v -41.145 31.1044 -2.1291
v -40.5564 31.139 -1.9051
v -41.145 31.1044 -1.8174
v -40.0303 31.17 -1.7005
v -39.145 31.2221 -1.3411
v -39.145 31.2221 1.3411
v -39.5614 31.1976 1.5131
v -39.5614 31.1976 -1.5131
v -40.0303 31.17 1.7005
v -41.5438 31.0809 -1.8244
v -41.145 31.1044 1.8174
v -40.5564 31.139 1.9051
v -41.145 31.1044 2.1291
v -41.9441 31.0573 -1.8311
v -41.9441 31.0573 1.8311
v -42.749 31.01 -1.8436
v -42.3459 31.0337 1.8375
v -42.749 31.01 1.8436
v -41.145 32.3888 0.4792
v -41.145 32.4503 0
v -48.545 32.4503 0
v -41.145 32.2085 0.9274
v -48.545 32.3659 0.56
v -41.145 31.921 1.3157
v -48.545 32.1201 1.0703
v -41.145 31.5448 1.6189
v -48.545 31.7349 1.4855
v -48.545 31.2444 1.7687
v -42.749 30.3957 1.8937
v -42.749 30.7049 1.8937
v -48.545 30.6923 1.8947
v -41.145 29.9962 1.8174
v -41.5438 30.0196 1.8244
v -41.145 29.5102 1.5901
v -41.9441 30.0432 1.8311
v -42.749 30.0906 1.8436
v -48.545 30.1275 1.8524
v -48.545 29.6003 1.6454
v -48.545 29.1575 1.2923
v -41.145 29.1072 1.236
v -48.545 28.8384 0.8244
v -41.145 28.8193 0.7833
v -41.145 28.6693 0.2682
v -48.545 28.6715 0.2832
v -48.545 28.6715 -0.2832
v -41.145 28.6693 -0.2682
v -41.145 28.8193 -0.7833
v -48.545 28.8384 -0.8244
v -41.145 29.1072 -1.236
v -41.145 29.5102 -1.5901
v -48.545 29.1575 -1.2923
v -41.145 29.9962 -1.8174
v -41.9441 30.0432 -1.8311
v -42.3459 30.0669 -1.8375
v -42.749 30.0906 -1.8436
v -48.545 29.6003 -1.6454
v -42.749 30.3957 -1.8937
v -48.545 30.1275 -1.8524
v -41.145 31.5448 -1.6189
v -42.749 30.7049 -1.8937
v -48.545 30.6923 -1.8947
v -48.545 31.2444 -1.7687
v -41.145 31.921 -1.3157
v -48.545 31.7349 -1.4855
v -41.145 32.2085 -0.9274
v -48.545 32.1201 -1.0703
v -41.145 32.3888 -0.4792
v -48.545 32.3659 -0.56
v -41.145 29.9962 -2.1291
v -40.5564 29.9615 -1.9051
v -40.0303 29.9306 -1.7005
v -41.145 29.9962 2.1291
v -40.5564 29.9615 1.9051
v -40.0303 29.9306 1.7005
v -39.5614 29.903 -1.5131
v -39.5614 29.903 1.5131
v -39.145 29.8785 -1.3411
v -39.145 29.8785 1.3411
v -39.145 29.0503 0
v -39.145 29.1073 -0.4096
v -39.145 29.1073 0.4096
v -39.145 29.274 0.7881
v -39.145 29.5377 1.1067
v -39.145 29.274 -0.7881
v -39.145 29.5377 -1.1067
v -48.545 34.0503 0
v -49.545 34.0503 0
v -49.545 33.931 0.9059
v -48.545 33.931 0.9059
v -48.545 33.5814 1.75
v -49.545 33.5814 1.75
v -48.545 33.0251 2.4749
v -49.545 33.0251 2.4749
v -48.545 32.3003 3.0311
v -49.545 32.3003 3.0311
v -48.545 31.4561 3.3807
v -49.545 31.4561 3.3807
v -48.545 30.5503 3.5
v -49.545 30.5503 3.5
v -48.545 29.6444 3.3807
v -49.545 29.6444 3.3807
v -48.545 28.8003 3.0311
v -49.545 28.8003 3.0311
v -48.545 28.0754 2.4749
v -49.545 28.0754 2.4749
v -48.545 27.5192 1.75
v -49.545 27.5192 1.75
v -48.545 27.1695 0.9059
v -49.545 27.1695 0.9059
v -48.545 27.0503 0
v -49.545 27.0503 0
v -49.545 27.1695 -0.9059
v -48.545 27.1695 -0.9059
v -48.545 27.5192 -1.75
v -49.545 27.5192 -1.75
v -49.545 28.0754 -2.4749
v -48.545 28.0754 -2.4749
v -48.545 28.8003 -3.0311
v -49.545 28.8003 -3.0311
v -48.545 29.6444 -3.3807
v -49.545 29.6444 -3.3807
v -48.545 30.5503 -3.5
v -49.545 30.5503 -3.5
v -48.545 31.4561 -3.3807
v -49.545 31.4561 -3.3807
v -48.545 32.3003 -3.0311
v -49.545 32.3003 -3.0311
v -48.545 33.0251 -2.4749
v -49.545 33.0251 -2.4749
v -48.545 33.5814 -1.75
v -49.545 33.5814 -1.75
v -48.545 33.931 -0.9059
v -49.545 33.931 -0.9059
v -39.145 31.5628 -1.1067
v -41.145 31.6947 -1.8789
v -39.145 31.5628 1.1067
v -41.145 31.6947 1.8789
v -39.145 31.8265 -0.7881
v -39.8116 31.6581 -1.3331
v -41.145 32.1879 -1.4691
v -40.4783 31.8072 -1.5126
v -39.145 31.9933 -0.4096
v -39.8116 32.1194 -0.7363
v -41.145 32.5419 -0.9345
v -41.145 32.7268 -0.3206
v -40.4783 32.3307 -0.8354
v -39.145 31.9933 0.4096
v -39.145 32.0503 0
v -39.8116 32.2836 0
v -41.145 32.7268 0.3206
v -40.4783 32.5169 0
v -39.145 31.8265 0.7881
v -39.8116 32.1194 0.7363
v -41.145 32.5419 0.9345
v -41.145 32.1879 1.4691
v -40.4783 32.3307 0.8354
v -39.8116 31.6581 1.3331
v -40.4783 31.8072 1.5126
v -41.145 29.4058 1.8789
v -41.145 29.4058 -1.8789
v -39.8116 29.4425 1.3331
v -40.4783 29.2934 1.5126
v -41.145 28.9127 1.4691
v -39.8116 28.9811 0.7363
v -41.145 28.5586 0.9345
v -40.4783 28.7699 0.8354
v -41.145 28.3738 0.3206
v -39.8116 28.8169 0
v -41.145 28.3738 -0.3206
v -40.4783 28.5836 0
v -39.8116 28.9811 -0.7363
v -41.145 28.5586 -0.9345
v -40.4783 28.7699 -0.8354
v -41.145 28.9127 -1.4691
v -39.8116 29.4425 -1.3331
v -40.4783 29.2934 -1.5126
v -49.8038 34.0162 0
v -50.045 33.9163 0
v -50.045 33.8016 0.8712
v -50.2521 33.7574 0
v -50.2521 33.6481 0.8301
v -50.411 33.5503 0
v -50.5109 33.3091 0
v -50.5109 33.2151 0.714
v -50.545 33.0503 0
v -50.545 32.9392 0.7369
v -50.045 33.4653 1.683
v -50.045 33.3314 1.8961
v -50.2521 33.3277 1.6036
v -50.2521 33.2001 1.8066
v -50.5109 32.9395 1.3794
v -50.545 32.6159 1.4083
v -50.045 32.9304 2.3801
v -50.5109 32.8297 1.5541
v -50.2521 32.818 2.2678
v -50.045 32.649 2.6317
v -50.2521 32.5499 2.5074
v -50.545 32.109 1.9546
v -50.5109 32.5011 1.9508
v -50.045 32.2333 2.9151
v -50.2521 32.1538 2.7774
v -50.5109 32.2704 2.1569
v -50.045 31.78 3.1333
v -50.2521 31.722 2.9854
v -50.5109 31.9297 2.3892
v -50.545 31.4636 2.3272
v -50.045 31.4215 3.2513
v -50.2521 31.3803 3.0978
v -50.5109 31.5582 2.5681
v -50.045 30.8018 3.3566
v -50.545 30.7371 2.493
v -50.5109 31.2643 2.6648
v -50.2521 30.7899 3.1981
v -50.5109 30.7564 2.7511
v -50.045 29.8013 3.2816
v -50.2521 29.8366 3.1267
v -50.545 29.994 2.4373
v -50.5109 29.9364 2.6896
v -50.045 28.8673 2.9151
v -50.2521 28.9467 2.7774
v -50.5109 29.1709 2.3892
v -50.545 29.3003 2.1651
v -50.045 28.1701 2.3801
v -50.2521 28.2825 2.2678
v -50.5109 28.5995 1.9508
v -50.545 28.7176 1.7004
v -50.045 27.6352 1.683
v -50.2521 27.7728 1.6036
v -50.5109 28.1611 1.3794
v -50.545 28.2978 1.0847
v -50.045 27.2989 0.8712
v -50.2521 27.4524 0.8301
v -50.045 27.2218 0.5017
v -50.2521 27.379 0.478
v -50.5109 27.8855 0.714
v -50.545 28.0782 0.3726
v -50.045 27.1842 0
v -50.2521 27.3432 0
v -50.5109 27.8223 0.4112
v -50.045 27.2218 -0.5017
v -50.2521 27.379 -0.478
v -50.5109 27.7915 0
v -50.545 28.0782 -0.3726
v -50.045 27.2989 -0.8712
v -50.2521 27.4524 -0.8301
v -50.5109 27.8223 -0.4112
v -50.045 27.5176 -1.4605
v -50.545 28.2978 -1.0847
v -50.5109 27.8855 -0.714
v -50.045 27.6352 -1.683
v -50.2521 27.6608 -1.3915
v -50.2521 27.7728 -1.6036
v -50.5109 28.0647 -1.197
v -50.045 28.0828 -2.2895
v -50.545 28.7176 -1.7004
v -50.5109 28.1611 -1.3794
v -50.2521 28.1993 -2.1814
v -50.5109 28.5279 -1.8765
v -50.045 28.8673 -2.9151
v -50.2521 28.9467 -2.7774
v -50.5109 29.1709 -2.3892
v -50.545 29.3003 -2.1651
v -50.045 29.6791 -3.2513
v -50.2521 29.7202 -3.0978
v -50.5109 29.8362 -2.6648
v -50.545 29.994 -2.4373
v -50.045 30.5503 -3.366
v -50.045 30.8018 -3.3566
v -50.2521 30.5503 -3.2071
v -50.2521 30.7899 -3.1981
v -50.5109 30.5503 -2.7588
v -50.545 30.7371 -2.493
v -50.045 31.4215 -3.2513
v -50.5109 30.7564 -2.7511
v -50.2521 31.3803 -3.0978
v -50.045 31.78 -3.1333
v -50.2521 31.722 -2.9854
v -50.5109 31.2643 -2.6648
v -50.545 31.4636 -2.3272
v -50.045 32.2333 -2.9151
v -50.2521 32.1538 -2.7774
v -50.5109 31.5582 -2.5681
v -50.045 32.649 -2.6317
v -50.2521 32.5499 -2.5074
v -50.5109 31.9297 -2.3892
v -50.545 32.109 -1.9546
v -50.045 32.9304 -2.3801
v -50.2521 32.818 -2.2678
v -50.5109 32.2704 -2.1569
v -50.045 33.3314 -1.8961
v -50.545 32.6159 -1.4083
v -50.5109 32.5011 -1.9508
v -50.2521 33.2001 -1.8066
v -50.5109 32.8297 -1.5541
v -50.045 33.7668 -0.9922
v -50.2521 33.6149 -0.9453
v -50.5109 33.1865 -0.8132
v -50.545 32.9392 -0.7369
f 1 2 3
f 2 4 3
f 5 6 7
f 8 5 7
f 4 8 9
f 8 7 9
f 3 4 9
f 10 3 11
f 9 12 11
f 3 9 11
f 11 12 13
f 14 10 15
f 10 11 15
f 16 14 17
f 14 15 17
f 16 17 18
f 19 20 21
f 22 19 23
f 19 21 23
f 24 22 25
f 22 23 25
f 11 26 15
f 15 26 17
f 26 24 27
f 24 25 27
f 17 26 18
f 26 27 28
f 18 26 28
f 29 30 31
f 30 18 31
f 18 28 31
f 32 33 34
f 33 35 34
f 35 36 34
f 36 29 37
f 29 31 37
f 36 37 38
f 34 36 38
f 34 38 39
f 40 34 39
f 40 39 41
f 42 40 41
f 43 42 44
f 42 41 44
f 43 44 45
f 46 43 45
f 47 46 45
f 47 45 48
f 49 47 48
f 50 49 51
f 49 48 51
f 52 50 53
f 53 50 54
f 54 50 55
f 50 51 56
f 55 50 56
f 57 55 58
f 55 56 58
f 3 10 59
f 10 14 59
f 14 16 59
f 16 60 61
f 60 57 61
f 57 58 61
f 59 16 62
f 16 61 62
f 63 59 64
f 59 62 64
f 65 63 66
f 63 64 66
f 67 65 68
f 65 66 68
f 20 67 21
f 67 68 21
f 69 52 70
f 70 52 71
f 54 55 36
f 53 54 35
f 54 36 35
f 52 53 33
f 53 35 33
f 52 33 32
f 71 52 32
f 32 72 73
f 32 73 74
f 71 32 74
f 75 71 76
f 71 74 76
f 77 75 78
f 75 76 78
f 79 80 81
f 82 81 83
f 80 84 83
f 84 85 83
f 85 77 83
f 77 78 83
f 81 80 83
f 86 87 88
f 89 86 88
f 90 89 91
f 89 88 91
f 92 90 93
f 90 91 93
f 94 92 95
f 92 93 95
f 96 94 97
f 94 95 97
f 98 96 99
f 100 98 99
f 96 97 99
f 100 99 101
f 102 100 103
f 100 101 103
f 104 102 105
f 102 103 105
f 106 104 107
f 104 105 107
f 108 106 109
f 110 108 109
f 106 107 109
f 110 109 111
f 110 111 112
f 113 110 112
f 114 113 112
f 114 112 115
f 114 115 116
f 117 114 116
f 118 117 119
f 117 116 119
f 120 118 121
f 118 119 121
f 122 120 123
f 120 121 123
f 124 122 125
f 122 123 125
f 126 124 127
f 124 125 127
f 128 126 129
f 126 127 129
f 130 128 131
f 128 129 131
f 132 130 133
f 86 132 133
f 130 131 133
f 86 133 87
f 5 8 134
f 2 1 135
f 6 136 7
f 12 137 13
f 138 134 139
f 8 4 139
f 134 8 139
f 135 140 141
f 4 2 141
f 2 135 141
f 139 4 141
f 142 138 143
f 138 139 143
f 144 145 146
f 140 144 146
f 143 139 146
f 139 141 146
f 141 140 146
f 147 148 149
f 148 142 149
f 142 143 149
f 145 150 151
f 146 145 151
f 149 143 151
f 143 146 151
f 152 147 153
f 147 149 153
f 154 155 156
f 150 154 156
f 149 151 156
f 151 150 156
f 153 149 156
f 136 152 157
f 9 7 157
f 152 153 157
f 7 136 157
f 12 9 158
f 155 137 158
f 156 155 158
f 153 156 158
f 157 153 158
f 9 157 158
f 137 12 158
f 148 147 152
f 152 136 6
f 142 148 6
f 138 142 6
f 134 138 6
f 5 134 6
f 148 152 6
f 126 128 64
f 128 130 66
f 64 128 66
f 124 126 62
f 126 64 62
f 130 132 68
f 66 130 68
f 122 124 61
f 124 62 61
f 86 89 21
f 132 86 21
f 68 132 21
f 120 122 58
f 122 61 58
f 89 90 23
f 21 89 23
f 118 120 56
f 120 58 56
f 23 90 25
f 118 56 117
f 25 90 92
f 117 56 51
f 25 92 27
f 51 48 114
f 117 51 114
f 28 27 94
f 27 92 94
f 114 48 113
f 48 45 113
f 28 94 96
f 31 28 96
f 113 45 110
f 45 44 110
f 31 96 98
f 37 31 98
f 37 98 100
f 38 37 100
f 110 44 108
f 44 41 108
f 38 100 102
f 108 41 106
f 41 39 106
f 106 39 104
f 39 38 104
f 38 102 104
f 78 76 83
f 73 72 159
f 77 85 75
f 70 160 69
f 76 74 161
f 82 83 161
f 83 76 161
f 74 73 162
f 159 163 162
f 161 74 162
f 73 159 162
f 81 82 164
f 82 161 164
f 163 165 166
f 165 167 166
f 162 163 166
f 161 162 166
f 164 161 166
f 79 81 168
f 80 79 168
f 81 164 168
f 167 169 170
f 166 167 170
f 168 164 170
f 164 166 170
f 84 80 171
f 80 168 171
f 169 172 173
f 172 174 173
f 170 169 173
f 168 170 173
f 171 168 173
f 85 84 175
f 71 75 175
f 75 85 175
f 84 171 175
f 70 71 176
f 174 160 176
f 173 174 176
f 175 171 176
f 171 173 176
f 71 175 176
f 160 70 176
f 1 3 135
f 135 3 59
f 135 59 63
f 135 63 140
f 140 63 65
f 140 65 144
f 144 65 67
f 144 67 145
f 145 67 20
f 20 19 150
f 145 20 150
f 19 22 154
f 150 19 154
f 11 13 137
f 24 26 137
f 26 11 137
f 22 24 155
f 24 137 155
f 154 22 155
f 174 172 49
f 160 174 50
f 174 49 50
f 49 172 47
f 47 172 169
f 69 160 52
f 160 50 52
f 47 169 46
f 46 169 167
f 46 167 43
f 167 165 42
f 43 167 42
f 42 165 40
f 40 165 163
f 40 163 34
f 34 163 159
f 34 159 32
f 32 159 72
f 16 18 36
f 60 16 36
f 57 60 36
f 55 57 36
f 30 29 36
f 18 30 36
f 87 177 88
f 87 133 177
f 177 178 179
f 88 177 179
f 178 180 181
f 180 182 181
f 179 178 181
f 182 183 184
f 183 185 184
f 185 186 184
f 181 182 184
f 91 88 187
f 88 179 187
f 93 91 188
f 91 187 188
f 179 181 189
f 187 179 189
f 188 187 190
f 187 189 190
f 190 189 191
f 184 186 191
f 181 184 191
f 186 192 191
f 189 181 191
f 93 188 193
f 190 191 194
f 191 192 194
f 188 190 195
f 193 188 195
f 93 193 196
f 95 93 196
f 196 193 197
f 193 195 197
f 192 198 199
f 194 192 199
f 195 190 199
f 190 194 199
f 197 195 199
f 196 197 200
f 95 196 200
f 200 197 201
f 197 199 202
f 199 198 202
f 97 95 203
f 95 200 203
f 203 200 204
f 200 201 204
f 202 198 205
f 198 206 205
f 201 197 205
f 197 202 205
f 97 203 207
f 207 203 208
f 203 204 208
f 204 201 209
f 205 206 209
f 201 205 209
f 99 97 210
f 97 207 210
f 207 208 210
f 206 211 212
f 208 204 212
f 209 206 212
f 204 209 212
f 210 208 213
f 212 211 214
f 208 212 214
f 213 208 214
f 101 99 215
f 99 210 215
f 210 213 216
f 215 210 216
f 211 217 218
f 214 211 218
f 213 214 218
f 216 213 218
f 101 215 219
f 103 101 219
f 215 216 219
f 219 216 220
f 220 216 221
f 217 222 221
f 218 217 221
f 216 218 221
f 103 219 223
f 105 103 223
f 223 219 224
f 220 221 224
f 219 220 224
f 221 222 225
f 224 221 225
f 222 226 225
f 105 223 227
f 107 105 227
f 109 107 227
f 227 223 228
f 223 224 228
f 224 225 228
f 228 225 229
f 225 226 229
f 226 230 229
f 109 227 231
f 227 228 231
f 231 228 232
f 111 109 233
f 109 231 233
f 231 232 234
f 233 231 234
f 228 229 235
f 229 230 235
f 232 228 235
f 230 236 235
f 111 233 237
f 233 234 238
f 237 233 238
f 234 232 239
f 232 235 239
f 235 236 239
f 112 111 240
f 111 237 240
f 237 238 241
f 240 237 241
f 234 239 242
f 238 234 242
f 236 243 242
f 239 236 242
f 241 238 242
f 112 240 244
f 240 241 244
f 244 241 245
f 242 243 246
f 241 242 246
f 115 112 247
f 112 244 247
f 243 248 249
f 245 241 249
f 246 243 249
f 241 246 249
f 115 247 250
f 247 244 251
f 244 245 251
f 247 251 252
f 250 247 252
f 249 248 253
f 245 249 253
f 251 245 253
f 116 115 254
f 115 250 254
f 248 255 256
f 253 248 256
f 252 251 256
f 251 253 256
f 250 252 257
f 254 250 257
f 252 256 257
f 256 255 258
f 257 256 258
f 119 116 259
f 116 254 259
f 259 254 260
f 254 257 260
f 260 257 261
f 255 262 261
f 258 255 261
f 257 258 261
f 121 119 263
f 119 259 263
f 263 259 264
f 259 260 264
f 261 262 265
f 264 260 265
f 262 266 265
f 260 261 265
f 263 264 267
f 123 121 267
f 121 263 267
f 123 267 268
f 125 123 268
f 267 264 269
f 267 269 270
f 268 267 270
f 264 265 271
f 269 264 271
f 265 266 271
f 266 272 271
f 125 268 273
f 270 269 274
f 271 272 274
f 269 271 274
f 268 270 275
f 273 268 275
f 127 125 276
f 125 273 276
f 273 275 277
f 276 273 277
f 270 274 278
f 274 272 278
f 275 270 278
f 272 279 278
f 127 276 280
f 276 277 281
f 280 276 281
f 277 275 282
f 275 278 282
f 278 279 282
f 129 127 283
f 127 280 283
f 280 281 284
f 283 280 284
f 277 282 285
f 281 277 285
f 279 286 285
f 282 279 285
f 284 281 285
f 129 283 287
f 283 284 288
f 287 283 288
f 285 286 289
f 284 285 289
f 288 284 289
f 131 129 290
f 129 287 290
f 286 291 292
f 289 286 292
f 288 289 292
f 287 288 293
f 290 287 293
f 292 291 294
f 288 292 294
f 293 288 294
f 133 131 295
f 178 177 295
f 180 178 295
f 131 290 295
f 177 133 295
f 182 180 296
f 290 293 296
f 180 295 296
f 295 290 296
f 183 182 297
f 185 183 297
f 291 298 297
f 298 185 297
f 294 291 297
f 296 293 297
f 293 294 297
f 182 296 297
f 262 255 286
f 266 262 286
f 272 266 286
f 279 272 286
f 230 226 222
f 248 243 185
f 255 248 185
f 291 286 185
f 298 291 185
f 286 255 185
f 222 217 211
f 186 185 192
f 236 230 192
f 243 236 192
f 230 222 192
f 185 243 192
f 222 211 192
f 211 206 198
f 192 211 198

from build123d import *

# Parameters (mm, degrees)
F2_DEPTH = 12.5
F3_R     = 1


with BuildPart() as f1:
    # F0 (on Top) → F1 (revolve)
    with BuildSketch(Plane.XY):
        Polygon((-48.5449684441, 34.0502707809), (-50.5449684441, 34.0502707809), (-50.5449684441, 30.5502707809), (-42.7490452468, 30.5502707809), (-42.7490452468, 31.0099636614), (-39.1449684441, 31.2220901251), (-39.1449684441, 32.0502707809), (-41.1449684441, 32.7502707809), (-41.1449684441, 32.4502707809), (-48.5449684441, 32.4502707809), align=None)
        Polygon((-42.7490452468, 31.0099636614), (-42.7490452468, 30.5502707809), (-39.1449684441, 30.5502707809), (-39.1449684441, 31.2220901251), align=None)
    revolve(axis=Axis((-41.4569408685, 30.5502707809, 0), (1, 0, 0)))

    # F0 (on Top) → F2 (cut, symmetric)
    with BuildSketch(Plane.XY):
        Polygon((-42.7490452468, 31.0099636614), (-42.7490452468, 30.5502707809), (-39.1449684441, 30.5502707809), (-39.1449684441, 31.2220901251), align=None)
        Polygon((-39.1449684441, 30.5502707809), (-42.7490452468, 30.5502707809), (-42.7490452468, 30.0905779004), (-39.1449684441, 29.8784514368), align=None)
    extrude(amount=F2_DEPTH, both=True, mode=Mode.SUBTRACT)

    # F3
    f3_edges = [f1.edges().sort_by_distance(p)[0] for p in [
        (-50.544968, 27.050271, 0),
    ]]
    fillet(f3_edges, radius=F3_R)


solid = f1.part
